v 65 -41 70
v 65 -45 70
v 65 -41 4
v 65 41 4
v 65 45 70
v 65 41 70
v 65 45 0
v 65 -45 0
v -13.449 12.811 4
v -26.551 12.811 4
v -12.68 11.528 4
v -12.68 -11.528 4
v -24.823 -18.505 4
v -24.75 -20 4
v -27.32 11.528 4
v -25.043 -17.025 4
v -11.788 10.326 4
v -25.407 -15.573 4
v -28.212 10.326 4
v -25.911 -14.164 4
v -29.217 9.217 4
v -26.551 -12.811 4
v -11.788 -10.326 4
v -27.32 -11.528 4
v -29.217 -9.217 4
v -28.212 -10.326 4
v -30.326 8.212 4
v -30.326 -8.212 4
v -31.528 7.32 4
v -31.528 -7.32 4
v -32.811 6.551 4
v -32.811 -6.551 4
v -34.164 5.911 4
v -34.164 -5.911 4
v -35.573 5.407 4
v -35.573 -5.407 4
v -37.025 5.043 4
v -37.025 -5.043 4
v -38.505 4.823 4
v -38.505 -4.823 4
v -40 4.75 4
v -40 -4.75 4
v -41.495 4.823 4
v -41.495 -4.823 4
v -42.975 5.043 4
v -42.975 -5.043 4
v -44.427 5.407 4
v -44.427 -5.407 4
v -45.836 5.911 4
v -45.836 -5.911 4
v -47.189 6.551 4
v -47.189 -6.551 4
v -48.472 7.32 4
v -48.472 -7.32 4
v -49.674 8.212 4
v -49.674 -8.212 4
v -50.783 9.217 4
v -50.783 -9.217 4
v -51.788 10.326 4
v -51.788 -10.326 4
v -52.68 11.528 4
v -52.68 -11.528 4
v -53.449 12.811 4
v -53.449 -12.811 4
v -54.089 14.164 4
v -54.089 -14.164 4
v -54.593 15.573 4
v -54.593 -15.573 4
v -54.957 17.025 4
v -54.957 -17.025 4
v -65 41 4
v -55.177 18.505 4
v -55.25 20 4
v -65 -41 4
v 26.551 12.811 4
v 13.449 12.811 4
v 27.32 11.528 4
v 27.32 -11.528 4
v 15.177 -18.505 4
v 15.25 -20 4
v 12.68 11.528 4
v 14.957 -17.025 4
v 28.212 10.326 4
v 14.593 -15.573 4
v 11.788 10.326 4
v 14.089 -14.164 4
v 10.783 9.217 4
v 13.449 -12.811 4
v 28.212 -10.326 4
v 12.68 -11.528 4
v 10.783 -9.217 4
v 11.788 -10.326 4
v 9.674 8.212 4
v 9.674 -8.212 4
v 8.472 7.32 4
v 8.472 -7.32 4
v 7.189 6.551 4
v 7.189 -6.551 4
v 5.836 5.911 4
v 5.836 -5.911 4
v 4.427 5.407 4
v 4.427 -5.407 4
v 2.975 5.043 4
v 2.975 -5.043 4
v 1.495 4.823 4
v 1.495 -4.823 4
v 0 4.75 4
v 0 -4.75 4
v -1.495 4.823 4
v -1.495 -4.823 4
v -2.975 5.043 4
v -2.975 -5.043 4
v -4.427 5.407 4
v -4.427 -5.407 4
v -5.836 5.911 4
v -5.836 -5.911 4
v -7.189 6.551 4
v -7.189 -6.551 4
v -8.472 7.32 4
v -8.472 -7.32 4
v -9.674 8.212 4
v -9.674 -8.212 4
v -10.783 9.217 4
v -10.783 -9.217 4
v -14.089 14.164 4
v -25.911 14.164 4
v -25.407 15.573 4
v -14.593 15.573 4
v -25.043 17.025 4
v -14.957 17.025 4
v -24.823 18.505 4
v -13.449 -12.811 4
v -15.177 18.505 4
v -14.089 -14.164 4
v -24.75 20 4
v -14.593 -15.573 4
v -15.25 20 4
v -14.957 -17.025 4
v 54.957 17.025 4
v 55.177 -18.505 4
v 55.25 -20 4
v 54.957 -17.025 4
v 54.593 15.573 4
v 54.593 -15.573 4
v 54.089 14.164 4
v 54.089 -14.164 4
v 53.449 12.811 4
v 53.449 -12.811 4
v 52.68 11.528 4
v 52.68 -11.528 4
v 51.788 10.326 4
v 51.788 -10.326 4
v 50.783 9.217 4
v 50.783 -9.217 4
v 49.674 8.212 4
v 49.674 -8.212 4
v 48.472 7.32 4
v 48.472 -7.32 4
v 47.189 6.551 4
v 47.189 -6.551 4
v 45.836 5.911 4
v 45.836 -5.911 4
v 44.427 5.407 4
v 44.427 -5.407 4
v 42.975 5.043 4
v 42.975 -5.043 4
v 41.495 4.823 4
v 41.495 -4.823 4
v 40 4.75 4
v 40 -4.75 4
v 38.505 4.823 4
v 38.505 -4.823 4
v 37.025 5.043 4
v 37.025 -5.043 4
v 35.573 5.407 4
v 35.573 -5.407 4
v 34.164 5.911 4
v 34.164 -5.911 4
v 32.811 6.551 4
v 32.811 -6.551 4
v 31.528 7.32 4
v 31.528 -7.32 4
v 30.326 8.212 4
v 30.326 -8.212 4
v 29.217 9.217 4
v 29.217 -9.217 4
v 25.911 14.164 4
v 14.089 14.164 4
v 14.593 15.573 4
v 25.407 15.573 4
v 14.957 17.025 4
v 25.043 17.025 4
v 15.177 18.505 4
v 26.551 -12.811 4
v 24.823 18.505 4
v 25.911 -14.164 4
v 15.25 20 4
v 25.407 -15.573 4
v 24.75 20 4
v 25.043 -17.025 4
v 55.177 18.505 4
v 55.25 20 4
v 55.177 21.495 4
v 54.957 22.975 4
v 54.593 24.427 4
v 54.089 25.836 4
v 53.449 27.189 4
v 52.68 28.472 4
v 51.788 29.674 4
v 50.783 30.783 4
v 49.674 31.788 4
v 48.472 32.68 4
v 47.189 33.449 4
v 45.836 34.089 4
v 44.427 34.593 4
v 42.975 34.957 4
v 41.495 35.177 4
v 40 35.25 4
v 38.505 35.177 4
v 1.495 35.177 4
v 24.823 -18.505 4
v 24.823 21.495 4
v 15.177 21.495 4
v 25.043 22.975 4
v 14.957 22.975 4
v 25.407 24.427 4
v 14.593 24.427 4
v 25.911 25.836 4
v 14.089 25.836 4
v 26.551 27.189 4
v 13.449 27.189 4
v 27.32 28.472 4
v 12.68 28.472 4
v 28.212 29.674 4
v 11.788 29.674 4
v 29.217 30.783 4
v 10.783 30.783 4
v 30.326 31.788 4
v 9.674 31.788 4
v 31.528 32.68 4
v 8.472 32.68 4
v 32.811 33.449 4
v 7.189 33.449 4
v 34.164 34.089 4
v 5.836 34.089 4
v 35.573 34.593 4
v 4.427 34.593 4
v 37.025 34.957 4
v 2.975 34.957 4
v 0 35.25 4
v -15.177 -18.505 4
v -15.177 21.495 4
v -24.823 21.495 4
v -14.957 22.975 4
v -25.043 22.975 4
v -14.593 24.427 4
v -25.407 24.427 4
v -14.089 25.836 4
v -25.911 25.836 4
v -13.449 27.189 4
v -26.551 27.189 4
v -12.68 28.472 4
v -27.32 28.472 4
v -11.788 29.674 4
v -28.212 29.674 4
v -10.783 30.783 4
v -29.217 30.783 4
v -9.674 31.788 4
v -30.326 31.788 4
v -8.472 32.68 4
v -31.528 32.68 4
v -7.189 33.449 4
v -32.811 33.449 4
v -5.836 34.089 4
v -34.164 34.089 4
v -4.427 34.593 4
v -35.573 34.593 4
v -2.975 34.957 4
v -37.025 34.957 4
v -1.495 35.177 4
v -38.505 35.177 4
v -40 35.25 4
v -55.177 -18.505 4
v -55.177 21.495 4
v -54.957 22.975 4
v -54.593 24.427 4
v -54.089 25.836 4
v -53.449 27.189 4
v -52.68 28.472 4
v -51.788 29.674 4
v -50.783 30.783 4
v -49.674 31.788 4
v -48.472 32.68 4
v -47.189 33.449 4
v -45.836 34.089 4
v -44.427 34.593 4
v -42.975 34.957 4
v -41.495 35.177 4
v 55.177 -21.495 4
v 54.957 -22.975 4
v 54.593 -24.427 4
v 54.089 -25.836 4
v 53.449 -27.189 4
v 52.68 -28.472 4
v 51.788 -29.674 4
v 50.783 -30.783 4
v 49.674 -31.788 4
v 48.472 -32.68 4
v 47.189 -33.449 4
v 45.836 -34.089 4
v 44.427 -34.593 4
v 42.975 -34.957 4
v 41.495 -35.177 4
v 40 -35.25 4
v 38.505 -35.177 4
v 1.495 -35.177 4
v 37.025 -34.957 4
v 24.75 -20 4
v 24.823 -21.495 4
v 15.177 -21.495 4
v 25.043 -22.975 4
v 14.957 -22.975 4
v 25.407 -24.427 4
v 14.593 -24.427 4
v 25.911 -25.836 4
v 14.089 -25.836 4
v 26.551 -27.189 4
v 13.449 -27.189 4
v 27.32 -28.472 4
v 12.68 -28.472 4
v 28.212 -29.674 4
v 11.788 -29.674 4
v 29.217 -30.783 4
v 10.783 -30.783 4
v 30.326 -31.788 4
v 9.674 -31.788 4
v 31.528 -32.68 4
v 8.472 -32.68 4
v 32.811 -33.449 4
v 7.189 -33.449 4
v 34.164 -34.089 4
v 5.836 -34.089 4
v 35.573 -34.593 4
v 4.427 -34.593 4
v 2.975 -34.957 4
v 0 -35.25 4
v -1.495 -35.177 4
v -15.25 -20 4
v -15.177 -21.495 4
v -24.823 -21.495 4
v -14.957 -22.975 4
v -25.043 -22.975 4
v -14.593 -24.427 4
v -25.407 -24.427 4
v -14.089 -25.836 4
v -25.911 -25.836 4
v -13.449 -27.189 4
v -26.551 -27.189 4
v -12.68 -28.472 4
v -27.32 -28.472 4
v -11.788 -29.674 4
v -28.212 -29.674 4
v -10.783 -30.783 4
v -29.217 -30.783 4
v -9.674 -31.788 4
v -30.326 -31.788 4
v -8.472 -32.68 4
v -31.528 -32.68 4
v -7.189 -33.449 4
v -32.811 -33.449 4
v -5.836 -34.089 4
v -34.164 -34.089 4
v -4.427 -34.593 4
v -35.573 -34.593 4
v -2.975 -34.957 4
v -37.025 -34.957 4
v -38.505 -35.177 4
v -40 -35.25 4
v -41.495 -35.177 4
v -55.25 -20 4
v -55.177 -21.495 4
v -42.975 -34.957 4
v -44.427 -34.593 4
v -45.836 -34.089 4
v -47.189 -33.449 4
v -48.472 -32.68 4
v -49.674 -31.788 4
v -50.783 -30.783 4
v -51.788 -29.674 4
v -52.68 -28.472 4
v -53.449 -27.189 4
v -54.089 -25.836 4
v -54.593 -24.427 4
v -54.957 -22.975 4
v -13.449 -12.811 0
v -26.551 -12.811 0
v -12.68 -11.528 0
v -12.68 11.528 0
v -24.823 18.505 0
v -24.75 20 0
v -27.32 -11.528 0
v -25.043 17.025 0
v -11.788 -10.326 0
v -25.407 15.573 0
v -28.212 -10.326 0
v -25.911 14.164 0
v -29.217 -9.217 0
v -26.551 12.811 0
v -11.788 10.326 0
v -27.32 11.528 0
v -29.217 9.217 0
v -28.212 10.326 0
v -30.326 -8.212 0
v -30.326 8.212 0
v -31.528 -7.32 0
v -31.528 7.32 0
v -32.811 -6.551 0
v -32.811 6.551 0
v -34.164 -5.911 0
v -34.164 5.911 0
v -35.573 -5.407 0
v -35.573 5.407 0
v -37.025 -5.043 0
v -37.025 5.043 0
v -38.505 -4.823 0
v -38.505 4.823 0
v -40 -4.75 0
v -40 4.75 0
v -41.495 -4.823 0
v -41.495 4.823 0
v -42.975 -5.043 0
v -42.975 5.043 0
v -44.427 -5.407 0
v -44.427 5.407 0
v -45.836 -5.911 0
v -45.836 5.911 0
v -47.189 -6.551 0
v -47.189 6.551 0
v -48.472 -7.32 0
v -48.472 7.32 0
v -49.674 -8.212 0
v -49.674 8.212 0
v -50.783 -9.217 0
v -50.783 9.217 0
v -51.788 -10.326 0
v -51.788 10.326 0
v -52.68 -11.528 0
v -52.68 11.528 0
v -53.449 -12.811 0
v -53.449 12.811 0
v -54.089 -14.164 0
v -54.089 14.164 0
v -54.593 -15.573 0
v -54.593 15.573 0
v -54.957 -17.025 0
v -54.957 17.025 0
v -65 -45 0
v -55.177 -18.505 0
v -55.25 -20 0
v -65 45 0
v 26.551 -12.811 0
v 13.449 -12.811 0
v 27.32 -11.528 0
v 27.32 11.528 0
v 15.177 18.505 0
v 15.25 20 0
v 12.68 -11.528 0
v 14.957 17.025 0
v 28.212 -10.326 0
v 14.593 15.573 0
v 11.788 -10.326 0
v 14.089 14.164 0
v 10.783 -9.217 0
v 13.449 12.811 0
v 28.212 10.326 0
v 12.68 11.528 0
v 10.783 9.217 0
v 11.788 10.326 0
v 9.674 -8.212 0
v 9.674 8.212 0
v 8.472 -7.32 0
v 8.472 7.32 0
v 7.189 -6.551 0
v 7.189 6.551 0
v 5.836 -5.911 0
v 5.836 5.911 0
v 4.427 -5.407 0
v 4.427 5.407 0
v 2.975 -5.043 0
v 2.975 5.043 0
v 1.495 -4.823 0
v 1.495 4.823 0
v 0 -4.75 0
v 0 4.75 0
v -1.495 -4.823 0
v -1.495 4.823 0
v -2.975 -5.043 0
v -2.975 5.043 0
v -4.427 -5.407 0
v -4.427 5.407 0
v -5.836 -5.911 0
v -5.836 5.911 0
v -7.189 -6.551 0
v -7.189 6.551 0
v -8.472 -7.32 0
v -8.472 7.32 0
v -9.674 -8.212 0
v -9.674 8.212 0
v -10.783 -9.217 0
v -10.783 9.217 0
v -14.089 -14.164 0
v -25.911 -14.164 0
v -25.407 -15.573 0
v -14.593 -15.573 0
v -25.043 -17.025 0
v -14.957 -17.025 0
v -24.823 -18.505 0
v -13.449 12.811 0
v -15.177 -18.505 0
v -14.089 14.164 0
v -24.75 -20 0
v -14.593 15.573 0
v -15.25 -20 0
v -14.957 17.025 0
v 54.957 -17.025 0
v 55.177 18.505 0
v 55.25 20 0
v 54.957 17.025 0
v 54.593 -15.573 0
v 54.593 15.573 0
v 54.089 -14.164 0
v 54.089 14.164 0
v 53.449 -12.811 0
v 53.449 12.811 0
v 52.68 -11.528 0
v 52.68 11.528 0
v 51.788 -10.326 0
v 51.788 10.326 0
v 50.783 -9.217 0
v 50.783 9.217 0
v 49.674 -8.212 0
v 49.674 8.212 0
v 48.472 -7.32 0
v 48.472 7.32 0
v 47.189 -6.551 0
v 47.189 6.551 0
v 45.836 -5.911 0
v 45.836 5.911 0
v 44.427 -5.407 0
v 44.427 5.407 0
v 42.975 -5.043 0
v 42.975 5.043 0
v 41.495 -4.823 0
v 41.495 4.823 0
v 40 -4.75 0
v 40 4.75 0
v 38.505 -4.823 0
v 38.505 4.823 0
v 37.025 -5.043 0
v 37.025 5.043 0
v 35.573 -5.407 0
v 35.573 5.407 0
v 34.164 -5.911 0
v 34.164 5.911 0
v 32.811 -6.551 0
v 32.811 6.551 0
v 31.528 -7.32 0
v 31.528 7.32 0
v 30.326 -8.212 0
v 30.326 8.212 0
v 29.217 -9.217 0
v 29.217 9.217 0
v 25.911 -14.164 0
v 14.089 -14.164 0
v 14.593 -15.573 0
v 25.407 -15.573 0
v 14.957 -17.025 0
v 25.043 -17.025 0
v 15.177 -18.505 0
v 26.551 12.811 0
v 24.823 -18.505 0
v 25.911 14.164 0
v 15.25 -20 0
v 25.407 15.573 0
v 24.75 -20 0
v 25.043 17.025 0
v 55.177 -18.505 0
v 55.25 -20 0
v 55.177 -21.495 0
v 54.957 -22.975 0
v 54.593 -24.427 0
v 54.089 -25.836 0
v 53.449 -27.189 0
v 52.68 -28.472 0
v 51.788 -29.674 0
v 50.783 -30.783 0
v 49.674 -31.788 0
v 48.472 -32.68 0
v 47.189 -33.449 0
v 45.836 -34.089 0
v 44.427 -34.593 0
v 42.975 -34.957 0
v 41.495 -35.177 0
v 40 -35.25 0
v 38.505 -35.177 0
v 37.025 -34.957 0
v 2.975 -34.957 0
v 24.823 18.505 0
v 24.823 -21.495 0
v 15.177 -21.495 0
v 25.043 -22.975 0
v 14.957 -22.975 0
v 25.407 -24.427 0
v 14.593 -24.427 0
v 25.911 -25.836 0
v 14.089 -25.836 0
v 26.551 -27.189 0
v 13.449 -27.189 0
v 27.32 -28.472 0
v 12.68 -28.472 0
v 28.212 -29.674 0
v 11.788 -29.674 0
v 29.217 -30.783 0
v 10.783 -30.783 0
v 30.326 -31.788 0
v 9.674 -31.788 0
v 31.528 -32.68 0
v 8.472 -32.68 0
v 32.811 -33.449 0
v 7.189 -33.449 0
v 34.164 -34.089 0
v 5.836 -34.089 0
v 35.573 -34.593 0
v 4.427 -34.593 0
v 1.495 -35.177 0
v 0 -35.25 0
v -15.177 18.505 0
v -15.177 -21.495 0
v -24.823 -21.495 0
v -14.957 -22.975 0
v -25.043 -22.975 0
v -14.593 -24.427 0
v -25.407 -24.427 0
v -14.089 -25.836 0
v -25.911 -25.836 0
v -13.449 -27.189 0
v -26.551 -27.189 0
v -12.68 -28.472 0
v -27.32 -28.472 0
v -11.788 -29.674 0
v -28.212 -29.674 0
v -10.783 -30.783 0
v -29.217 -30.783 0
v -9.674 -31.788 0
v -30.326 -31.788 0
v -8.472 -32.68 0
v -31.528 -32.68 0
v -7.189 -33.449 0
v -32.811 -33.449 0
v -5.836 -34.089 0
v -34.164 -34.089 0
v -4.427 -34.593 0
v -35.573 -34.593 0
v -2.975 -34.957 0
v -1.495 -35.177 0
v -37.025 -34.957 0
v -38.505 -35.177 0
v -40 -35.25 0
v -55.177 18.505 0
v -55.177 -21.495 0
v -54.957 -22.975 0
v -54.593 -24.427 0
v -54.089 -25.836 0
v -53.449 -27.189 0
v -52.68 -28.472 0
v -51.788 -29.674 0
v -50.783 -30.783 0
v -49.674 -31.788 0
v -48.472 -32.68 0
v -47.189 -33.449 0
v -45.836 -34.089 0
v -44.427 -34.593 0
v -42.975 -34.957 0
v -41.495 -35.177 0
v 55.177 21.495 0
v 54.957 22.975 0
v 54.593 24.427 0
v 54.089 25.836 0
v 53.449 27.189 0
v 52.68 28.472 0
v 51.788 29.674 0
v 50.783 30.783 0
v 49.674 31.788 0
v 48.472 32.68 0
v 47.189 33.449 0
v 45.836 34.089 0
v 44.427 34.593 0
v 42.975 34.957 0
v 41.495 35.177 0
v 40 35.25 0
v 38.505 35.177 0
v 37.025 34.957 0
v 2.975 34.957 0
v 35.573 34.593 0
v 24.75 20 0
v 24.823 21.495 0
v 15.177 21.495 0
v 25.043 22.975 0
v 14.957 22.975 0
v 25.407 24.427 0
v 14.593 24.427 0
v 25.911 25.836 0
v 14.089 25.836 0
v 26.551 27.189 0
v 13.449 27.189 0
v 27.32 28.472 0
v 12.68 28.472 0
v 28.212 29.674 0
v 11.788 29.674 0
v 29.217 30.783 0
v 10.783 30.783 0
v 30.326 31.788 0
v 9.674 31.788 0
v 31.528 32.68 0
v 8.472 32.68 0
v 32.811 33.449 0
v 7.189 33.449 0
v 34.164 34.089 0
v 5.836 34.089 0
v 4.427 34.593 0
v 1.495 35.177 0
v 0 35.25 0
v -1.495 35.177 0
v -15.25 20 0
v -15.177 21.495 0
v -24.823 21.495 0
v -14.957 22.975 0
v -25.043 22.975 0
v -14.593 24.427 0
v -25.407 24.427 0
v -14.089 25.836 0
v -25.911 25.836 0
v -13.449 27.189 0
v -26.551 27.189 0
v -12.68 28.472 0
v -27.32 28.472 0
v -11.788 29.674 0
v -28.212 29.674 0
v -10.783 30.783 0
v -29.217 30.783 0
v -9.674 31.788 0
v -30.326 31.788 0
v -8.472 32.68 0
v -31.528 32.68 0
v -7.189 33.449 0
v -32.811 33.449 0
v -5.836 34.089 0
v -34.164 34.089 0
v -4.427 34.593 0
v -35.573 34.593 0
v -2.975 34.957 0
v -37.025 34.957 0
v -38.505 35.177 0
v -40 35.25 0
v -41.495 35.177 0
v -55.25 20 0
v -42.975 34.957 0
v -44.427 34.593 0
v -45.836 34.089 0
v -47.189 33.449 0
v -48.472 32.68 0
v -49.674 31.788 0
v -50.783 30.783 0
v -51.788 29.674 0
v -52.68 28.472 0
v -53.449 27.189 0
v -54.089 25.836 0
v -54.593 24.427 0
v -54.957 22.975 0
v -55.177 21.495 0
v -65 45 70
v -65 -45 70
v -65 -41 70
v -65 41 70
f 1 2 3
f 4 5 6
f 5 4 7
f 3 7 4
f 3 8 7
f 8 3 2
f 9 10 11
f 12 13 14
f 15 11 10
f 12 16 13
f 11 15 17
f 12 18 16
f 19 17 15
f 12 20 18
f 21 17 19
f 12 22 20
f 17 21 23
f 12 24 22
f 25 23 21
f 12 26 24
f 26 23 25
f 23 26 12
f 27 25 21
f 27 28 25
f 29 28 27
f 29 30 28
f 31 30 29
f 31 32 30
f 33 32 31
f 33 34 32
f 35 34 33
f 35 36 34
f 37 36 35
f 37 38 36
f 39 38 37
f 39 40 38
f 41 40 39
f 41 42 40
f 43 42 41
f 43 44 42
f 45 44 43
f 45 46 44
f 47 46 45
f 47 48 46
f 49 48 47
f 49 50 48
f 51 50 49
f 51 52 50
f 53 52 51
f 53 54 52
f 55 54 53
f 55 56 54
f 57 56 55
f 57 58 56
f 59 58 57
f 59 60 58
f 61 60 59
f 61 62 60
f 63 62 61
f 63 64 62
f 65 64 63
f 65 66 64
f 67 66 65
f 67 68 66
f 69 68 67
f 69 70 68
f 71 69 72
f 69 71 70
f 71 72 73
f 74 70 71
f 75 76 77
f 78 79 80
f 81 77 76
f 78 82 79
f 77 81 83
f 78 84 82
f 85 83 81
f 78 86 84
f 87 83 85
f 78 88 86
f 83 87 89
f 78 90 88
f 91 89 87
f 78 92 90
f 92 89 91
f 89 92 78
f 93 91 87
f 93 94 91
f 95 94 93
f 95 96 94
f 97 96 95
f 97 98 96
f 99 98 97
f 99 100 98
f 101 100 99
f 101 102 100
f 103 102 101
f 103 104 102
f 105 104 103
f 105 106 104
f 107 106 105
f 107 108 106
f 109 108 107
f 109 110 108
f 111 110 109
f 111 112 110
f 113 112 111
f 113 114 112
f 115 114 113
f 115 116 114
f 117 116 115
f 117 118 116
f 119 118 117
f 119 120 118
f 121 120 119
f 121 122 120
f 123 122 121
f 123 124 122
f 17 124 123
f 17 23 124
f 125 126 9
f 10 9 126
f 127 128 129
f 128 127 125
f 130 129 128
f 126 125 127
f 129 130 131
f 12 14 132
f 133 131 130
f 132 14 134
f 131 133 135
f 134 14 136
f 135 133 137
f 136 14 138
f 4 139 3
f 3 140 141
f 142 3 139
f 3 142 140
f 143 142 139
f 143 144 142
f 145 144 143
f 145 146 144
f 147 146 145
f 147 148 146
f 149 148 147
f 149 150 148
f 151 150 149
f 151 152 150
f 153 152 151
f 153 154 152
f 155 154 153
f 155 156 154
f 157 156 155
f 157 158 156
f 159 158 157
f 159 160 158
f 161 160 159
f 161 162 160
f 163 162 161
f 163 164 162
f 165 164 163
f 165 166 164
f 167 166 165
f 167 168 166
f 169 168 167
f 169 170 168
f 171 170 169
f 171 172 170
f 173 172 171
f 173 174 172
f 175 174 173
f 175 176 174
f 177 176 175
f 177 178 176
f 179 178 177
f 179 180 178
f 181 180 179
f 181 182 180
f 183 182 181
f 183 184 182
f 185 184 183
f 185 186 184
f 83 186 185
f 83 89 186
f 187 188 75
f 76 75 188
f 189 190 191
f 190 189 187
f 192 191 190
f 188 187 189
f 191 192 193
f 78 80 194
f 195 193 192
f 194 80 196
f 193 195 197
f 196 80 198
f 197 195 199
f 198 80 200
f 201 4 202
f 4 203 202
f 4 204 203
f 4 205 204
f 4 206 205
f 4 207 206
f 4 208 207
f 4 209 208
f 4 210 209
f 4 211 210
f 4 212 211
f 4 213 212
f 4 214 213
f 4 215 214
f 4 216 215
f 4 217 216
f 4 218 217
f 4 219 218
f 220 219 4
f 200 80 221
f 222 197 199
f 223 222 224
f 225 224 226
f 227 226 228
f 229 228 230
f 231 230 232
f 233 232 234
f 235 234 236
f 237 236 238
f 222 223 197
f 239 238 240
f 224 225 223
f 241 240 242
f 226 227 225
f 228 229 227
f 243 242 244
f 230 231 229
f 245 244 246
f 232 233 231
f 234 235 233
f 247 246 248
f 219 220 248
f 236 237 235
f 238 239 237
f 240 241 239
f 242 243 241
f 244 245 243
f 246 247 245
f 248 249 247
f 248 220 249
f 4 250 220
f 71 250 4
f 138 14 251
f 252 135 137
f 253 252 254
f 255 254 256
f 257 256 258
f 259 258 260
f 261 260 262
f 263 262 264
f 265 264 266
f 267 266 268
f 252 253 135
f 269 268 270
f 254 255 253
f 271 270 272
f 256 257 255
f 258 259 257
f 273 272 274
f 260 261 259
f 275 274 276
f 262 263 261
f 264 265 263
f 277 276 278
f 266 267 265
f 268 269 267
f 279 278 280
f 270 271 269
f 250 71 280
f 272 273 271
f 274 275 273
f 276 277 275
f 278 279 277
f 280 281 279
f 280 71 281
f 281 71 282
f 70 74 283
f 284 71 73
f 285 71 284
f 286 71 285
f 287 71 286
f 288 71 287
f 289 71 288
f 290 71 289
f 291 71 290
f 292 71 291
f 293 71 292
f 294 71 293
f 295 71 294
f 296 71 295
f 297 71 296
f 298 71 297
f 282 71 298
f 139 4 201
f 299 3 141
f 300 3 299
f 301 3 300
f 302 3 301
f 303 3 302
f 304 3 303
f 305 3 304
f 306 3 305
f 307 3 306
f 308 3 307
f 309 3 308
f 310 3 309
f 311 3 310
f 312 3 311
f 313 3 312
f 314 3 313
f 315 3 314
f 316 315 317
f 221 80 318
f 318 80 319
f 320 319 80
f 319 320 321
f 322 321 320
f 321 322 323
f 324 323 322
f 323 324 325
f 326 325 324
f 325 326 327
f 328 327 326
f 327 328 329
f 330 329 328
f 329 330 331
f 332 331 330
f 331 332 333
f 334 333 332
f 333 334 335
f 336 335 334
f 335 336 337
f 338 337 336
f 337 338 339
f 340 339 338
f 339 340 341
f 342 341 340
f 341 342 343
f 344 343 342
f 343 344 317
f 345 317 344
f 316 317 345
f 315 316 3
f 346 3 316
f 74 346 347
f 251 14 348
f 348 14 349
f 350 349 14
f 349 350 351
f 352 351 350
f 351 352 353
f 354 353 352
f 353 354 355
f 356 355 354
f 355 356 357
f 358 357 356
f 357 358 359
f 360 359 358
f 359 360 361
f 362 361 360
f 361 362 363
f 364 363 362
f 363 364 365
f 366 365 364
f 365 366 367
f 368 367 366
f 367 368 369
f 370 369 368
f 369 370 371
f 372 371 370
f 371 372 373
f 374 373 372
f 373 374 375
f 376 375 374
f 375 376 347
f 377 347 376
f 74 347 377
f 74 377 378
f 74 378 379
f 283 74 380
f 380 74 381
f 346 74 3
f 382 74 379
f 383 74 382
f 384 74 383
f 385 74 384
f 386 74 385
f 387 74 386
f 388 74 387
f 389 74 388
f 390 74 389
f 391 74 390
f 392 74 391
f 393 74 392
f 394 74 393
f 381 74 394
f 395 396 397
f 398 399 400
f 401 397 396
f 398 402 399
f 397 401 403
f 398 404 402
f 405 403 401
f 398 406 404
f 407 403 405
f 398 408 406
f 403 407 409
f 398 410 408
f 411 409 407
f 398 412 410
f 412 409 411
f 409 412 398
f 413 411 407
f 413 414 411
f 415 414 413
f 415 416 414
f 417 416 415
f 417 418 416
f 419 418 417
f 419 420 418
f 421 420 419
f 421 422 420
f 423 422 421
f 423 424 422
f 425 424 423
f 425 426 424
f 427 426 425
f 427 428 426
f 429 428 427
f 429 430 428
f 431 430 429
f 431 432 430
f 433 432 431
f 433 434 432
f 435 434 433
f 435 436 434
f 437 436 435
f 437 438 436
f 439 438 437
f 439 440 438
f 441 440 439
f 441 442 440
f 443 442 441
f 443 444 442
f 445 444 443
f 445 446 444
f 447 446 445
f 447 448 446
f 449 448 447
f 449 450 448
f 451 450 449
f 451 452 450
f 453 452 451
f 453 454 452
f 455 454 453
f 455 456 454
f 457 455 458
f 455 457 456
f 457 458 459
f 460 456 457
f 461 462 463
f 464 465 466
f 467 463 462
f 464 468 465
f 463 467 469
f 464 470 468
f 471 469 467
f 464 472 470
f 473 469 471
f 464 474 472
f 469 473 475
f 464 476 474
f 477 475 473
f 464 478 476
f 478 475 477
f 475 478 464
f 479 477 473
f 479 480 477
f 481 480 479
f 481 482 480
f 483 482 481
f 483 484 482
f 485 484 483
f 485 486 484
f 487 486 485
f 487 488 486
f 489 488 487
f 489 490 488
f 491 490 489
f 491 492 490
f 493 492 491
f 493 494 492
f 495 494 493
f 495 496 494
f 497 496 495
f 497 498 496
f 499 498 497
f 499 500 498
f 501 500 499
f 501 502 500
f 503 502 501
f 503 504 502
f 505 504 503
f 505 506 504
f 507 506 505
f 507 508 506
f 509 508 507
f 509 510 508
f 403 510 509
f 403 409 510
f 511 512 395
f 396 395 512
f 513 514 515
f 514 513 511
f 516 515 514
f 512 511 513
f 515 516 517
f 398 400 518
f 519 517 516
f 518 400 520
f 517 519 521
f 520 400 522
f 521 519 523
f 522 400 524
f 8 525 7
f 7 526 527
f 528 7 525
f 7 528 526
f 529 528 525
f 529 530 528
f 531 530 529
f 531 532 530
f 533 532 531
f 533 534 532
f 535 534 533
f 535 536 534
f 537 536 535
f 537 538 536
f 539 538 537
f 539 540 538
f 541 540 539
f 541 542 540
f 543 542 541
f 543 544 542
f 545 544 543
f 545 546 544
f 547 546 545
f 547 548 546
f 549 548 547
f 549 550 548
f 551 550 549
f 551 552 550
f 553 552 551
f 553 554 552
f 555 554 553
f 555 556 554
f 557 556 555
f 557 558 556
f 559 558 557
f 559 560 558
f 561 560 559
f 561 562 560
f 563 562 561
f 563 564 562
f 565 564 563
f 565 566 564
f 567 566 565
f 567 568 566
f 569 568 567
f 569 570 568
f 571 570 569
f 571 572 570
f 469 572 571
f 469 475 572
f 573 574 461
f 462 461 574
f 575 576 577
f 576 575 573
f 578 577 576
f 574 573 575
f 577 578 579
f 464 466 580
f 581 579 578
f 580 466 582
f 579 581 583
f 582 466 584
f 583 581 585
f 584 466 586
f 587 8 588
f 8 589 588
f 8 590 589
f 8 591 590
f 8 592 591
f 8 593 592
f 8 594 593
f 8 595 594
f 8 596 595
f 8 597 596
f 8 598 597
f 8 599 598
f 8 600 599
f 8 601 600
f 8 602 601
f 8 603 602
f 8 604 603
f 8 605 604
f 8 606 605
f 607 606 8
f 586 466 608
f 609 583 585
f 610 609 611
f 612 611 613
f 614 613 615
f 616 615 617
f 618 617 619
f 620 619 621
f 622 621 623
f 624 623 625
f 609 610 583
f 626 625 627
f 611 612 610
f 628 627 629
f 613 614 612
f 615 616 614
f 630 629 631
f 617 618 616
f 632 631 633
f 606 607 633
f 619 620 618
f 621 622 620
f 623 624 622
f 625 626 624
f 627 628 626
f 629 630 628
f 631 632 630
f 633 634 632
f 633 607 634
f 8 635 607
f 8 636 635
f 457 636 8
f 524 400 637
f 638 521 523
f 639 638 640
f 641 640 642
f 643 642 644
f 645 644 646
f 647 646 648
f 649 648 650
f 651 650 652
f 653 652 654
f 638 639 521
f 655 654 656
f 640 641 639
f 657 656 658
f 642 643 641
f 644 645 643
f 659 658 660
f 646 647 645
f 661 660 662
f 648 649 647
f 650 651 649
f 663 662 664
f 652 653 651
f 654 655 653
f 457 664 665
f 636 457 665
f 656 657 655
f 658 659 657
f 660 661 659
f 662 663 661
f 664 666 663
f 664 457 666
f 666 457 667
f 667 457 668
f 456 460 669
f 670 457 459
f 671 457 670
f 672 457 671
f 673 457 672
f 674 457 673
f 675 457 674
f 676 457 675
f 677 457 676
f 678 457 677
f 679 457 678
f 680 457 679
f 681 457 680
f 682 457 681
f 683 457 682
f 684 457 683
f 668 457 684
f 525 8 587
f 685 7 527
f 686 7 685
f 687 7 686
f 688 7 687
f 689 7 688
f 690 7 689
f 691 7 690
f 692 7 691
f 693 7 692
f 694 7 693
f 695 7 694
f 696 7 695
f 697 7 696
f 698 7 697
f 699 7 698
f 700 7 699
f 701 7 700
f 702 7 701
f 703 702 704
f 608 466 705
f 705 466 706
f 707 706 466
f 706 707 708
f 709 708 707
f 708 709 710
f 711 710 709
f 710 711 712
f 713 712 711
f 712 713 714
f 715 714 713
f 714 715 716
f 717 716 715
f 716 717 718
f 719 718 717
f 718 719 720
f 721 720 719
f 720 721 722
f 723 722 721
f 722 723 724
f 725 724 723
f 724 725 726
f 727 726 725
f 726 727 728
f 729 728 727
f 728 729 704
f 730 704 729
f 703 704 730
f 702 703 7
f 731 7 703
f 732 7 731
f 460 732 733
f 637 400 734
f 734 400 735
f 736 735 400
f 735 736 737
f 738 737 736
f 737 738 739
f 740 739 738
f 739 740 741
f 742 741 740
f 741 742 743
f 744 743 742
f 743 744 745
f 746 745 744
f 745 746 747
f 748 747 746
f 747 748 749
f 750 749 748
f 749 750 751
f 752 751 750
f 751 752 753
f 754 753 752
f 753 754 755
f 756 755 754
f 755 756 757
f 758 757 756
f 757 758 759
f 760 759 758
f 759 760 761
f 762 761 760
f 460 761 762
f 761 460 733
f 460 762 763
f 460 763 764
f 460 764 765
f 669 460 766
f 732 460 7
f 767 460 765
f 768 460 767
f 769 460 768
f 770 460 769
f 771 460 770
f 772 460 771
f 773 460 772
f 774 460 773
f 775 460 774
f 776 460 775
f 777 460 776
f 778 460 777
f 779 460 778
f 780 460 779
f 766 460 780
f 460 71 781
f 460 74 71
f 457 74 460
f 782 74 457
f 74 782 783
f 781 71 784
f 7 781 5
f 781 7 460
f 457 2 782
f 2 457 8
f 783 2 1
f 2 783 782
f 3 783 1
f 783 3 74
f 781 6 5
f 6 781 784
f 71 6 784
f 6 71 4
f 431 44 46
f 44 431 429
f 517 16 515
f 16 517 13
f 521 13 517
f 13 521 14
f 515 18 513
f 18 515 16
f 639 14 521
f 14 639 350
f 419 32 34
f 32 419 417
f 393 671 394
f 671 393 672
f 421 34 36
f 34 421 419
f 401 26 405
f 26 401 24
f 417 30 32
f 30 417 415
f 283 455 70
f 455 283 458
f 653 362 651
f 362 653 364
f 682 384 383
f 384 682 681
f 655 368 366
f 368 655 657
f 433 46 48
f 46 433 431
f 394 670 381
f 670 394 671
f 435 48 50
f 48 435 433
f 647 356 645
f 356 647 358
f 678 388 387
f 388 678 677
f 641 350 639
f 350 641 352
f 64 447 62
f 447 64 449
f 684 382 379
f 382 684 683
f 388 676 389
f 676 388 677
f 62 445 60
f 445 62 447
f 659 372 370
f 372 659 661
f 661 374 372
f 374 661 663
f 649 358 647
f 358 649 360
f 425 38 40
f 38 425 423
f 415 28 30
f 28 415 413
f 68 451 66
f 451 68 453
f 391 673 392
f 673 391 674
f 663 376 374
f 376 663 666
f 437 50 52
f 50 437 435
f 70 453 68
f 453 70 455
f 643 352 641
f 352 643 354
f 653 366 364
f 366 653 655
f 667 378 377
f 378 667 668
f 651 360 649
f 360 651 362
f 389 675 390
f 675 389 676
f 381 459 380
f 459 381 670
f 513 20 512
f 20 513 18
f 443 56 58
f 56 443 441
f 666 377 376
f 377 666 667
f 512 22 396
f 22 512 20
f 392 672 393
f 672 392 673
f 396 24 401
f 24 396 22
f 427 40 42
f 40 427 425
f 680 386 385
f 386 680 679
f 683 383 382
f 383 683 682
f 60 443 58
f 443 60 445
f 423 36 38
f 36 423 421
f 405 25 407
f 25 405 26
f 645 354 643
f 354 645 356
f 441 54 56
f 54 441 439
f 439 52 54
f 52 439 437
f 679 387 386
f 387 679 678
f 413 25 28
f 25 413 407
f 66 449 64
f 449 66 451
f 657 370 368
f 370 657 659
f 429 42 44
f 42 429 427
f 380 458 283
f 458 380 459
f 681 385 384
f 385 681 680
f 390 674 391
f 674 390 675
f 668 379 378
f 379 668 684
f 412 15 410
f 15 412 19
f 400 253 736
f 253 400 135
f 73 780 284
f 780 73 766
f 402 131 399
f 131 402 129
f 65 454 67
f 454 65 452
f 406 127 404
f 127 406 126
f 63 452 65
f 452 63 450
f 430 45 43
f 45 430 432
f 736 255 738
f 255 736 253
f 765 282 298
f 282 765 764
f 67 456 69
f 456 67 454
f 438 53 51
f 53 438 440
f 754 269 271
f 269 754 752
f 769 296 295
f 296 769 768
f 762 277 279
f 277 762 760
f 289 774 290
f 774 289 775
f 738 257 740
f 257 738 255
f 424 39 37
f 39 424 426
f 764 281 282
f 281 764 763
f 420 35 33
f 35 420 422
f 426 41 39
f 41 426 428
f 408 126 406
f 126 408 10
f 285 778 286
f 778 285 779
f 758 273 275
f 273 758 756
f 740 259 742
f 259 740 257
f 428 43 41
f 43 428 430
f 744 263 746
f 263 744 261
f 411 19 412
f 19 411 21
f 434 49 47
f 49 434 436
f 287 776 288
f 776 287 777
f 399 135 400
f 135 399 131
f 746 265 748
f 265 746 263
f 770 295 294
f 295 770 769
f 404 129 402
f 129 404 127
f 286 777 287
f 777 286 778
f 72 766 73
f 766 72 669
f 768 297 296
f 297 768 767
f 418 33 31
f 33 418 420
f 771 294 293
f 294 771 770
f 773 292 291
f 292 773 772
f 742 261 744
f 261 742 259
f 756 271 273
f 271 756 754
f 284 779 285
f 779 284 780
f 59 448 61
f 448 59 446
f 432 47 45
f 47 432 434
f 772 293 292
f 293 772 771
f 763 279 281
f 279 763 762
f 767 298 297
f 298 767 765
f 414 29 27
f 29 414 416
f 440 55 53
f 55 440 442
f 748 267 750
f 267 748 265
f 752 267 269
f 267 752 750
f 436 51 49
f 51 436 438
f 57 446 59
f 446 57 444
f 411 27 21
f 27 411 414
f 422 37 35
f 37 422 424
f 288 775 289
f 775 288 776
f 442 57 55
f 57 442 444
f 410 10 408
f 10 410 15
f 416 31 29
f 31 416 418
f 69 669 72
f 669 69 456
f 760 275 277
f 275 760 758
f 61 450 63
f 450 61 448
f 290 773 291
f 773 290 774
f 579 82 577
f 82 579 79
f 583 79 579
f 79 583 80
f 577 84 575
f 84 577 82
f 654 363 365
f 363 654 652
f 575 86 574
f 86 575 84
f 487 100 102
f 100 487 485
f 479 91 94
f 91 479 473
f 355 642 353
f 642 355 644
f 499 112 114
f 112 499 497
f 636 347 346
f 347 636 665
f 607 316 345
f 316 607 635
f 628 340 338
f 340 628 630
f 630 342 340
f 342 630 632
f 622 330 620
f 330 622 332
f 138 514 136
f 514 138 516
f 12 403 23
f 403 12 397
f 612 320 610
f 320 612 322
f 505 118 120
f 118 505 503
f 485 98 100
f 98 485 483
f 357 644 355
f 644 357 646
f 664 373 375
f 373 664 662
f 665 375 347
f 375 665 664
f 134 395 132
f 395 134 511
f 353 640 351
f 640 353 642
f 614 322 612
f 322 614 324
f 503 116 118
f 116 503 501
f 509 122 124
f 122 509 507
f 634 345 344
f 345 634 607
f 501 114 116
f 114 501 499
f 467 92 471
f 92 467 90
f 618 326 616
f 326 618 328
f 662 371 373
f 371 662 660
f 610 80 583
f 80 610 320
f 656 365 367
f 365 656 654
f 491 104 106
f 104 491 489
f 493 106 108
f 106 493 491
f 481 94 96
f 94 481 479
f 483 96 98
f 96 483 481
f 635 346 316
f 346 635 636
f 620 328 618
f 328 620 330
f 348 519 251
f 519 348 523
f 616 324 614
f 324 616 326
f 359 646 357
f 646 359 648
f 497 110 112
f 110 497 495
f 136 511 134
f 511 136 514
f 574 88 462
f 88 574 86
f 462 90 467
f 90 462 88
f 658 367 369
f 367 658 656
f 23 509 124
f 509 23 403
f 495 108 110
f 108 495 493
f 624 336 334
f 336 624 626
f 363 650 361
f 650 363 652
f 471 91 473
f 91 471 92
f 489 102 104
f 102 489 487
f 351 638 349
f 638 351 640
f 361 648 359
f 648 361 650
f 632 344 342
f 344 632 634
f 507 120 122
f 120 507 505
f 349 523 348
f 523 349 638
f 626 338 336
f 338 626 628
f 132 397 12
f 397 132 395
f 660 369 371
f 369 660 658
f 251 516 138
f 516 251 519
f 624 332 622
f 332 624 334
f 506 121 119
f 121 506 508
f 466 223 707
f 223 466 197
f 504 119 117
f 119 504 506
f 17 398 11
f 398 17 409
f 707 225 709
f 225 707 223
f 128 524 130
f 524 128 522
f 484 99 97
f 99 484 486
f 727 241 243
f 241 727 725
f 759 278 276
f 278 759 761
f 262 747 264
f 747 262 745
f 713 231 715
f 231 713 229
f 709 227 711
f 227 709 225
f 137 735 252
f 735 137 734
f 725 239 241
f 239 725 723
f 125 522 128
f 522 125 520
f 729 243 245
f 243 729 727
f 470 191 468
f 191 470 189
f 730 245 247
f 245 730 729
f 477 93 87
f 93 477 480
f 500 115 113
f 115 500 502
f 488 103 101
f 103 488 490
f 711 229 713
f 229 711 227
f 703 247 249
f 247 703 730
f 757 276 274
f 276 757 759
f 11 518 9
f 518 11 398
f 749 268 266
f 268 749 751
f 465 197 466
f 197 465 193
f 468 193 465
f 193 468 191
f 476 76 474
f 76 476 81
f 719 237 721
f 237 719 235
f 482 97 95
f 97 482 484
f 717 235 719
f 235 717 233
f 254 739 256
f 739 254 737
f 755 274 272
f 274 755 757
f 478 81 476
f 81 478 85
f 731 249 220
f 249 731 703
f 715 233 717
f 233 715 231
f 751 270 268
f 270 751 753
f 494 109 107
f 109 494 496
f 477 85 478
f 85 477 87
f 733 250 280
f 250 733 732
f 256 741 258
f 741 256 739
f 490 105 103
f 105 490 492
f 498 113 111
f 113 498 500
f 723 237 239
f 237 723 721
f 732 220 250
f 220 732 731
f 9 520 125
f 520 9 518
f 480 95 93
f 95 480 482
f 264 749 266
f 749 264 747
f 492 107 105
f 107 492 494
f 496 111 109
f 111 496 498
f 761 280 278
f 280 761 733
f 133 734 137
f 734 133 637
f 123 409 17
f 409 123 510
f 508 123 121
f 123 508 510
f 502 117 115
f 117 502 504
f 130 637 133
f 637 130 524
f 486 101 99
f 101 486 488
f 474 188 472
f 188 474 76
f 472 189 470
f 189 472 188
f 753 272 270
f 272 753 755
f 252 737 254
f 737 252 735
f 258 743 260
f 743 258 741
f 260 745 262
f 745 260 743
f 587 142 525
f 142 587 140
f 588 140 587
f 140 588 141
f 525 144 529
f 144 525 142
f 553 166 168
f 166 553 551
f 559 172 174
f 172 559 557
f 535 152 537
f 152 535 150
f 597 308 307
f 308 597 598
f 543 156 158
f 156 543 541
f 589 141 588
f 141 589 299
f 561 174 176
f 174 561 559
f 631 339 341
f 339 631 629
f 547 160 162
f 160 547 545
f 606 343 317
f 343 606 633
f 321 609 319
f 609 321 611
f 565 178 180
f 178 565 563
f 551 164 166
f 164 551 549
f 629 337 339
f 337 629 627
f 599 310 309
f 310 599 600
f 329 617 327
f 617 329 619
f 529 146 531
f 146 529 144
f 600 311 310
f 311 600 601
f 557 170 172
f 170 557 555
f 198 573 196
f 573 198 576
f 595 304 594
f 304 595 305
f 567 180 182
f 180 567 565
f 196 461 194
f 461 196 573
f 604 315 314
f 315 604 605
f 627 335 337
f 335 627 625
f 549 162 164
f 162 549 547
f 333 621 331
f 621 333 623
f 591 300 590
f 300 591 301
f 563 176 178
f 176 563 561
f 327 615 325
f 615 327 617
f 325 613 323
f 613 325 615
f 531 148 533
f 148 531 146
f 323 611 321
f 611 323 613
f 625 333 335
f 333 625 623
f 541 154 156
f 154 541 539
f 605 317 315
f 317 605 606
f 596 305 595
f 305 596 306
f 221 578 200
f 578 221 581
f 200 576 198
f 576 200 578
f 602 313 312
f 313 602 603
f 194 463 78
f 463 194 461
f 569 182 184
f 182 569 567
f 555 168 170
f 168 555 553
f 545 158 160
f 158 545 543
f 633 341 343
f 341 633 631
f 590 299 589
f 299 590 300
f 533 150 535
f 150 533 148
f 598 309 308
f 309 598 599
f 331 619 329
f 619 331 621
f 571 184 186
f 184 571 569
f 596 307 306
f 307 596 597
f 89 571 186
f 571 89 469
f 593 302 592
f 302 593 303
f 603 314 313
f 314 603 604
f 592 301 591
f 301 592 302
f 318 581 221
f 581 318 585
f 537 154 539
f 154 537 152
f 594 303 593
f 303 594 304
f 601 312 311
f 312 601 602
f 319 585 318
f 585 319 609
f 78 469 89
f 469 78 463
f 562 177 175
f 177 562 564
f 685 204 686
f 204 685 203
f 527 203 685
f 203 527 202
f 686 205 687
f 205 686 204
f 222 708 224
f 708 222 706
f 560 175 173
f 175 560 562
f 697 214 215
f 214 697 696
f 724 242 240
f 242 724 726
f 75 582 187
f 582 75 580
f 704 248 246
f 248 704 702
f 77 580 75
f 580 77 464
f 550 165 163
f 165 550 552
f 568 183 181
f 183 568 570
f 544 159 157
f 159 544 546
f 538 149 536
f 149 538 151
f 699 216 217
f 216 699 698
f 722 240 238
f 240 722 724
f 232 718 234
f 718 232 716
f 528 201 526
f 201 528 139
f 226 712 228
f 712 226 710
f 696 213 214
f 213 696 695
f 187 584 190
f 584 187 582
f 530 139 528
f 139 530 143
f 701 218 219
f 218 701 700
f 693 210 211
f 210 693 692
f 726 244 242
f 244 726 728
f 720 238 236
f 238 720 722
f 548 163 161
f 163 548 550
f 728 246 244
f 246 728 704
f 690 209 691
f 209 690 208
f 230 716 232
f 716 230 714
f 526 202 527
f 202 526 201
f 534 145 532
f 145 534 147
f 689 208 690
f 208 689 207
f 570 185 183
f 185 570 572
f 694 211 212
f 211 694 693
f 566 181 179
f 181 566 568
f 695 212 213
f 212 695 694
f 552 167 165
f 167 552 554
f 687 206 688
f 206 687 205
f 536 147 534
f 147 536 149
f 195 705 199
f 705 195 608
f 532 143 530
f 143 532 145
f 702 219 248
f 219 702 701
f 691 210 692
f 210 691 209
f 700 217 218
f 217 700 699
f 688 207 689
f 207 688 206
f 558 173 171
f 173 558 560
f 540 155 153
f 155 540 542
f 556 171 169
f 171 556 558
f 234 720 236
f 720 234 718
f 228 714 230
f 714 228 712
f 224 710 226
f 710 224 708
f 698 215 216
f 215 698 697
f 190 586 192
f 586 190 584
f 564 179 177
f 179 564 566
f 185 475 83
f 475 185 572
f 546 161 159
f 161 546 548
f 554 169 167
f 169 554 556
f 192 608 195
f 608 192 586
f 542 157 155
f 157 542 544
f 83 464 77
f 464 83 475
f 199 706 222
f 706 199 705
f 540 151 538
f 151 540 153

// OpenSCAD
// Rack for six 50 mL conical tubes
// Designed to be printed upside down (walls at Z=0 to Z=66) 
// and flipped to stand on the walls.

// --- Dimensions ---
plate_x      = 130.0; // Length of the plate (X)
plate_y      = 90.0;  // Width of the plate (Y)
plate_z      = 4.0;   // Thickness of the plate (Z)

hole_d       = 30.5;  // Diameter of the tube holes
rows         = 2;     // Number of rows along Y
cols         = 3;     // Number of columns along X
spacing_x    = 40.0;  // Center-to-center distance X
spacing_y    = 40.0;  // Center-to-center distance Y

wall_thick   = 4.0;   // Thickness of the side walls (Y direction)
wall_height  = 70.0;  // Total height from the base of the plate (Z)

$fn = 64;

// --- Calculations ---
// The user specifies the part is printed upside down.
// In print orientation (Z=0 is bed):
// The plate is at the top (Z = wall_height - plate_z to wall_height).
// The walls are at the bottom (Z = 0 to wall_height - plate_z).
// However, the prompt says: "a flat plate... 4mm thick lies on the bed (z=0 to 4)".
// And "Two solid walls... rises from the plate to z=70".
// This implies the plate is the base in the "printed" state, but the user says 
// "It is printed upside down and flipped over after printing."
// If it is printed upside down, the "top" of the final object (the plate) 
// is at Z=0 in the slicer.
// Let's follow the explicit Z-coordinates provided for the print orientation:
// Plate: Z = 0 to 4.
// Walls: Rise from plate to Z = 70.
// Total height = 70.

// --- Modeling ---

module rack() {
    difference() {
        // Main Body: Plate + Walls
        union() {
            // The Plate
            translate([-plate_x/2, -plate_y/2, 0])
                cube([plate_x, plate_y, plate_z]);
            
            // The Walls (along the long edges, flush with the edges)
            // Long edges are X direction (130mm).
            // Wall 1 at Y = -plate_y/2
            translate([-plate_x/2, -plate_y/2, plate_z])
                cube([plate_x, wall_thick, wall_height - plate_z]);
            
            // Wall 2 at Y = plate_y/2 - wall_thick
            translate([-plate_x/2, plate_y/2 - wall_thick, plate_z])
                cube([plate_x, wall_thick, wall_height - plate_z]);
        }

        // The Holes
        // Holes are centered on the plate.
        // X centers: 0, +/- 40
        // Y centers: +/- 20 (since spacing is 40 and they are centered)
        // Wait, if spacing is 40 and there are 2 rows, centers are at +/- 20.
        // If spacing is 40 and there are 3 columns, centers are at 0, +/- 40.
        
        for (i = [0 : cols - 1]) {
            for (j = [0 : rows - 1]) {
                // Calculate offsets to center the grid
                let (
                    x_off = (i - (cols - 1) / 2) * spacing_x,
                    y_off = (j - (rows - 1) / 2) * spacing_y
                )
                translate([x_off, y_off, -1]) // Extend slightly to ensure clean cut
                    cylinder(h = plate_z + 2, d = hole_d);
            }
        }
    }
}

// Render the part
rack();
